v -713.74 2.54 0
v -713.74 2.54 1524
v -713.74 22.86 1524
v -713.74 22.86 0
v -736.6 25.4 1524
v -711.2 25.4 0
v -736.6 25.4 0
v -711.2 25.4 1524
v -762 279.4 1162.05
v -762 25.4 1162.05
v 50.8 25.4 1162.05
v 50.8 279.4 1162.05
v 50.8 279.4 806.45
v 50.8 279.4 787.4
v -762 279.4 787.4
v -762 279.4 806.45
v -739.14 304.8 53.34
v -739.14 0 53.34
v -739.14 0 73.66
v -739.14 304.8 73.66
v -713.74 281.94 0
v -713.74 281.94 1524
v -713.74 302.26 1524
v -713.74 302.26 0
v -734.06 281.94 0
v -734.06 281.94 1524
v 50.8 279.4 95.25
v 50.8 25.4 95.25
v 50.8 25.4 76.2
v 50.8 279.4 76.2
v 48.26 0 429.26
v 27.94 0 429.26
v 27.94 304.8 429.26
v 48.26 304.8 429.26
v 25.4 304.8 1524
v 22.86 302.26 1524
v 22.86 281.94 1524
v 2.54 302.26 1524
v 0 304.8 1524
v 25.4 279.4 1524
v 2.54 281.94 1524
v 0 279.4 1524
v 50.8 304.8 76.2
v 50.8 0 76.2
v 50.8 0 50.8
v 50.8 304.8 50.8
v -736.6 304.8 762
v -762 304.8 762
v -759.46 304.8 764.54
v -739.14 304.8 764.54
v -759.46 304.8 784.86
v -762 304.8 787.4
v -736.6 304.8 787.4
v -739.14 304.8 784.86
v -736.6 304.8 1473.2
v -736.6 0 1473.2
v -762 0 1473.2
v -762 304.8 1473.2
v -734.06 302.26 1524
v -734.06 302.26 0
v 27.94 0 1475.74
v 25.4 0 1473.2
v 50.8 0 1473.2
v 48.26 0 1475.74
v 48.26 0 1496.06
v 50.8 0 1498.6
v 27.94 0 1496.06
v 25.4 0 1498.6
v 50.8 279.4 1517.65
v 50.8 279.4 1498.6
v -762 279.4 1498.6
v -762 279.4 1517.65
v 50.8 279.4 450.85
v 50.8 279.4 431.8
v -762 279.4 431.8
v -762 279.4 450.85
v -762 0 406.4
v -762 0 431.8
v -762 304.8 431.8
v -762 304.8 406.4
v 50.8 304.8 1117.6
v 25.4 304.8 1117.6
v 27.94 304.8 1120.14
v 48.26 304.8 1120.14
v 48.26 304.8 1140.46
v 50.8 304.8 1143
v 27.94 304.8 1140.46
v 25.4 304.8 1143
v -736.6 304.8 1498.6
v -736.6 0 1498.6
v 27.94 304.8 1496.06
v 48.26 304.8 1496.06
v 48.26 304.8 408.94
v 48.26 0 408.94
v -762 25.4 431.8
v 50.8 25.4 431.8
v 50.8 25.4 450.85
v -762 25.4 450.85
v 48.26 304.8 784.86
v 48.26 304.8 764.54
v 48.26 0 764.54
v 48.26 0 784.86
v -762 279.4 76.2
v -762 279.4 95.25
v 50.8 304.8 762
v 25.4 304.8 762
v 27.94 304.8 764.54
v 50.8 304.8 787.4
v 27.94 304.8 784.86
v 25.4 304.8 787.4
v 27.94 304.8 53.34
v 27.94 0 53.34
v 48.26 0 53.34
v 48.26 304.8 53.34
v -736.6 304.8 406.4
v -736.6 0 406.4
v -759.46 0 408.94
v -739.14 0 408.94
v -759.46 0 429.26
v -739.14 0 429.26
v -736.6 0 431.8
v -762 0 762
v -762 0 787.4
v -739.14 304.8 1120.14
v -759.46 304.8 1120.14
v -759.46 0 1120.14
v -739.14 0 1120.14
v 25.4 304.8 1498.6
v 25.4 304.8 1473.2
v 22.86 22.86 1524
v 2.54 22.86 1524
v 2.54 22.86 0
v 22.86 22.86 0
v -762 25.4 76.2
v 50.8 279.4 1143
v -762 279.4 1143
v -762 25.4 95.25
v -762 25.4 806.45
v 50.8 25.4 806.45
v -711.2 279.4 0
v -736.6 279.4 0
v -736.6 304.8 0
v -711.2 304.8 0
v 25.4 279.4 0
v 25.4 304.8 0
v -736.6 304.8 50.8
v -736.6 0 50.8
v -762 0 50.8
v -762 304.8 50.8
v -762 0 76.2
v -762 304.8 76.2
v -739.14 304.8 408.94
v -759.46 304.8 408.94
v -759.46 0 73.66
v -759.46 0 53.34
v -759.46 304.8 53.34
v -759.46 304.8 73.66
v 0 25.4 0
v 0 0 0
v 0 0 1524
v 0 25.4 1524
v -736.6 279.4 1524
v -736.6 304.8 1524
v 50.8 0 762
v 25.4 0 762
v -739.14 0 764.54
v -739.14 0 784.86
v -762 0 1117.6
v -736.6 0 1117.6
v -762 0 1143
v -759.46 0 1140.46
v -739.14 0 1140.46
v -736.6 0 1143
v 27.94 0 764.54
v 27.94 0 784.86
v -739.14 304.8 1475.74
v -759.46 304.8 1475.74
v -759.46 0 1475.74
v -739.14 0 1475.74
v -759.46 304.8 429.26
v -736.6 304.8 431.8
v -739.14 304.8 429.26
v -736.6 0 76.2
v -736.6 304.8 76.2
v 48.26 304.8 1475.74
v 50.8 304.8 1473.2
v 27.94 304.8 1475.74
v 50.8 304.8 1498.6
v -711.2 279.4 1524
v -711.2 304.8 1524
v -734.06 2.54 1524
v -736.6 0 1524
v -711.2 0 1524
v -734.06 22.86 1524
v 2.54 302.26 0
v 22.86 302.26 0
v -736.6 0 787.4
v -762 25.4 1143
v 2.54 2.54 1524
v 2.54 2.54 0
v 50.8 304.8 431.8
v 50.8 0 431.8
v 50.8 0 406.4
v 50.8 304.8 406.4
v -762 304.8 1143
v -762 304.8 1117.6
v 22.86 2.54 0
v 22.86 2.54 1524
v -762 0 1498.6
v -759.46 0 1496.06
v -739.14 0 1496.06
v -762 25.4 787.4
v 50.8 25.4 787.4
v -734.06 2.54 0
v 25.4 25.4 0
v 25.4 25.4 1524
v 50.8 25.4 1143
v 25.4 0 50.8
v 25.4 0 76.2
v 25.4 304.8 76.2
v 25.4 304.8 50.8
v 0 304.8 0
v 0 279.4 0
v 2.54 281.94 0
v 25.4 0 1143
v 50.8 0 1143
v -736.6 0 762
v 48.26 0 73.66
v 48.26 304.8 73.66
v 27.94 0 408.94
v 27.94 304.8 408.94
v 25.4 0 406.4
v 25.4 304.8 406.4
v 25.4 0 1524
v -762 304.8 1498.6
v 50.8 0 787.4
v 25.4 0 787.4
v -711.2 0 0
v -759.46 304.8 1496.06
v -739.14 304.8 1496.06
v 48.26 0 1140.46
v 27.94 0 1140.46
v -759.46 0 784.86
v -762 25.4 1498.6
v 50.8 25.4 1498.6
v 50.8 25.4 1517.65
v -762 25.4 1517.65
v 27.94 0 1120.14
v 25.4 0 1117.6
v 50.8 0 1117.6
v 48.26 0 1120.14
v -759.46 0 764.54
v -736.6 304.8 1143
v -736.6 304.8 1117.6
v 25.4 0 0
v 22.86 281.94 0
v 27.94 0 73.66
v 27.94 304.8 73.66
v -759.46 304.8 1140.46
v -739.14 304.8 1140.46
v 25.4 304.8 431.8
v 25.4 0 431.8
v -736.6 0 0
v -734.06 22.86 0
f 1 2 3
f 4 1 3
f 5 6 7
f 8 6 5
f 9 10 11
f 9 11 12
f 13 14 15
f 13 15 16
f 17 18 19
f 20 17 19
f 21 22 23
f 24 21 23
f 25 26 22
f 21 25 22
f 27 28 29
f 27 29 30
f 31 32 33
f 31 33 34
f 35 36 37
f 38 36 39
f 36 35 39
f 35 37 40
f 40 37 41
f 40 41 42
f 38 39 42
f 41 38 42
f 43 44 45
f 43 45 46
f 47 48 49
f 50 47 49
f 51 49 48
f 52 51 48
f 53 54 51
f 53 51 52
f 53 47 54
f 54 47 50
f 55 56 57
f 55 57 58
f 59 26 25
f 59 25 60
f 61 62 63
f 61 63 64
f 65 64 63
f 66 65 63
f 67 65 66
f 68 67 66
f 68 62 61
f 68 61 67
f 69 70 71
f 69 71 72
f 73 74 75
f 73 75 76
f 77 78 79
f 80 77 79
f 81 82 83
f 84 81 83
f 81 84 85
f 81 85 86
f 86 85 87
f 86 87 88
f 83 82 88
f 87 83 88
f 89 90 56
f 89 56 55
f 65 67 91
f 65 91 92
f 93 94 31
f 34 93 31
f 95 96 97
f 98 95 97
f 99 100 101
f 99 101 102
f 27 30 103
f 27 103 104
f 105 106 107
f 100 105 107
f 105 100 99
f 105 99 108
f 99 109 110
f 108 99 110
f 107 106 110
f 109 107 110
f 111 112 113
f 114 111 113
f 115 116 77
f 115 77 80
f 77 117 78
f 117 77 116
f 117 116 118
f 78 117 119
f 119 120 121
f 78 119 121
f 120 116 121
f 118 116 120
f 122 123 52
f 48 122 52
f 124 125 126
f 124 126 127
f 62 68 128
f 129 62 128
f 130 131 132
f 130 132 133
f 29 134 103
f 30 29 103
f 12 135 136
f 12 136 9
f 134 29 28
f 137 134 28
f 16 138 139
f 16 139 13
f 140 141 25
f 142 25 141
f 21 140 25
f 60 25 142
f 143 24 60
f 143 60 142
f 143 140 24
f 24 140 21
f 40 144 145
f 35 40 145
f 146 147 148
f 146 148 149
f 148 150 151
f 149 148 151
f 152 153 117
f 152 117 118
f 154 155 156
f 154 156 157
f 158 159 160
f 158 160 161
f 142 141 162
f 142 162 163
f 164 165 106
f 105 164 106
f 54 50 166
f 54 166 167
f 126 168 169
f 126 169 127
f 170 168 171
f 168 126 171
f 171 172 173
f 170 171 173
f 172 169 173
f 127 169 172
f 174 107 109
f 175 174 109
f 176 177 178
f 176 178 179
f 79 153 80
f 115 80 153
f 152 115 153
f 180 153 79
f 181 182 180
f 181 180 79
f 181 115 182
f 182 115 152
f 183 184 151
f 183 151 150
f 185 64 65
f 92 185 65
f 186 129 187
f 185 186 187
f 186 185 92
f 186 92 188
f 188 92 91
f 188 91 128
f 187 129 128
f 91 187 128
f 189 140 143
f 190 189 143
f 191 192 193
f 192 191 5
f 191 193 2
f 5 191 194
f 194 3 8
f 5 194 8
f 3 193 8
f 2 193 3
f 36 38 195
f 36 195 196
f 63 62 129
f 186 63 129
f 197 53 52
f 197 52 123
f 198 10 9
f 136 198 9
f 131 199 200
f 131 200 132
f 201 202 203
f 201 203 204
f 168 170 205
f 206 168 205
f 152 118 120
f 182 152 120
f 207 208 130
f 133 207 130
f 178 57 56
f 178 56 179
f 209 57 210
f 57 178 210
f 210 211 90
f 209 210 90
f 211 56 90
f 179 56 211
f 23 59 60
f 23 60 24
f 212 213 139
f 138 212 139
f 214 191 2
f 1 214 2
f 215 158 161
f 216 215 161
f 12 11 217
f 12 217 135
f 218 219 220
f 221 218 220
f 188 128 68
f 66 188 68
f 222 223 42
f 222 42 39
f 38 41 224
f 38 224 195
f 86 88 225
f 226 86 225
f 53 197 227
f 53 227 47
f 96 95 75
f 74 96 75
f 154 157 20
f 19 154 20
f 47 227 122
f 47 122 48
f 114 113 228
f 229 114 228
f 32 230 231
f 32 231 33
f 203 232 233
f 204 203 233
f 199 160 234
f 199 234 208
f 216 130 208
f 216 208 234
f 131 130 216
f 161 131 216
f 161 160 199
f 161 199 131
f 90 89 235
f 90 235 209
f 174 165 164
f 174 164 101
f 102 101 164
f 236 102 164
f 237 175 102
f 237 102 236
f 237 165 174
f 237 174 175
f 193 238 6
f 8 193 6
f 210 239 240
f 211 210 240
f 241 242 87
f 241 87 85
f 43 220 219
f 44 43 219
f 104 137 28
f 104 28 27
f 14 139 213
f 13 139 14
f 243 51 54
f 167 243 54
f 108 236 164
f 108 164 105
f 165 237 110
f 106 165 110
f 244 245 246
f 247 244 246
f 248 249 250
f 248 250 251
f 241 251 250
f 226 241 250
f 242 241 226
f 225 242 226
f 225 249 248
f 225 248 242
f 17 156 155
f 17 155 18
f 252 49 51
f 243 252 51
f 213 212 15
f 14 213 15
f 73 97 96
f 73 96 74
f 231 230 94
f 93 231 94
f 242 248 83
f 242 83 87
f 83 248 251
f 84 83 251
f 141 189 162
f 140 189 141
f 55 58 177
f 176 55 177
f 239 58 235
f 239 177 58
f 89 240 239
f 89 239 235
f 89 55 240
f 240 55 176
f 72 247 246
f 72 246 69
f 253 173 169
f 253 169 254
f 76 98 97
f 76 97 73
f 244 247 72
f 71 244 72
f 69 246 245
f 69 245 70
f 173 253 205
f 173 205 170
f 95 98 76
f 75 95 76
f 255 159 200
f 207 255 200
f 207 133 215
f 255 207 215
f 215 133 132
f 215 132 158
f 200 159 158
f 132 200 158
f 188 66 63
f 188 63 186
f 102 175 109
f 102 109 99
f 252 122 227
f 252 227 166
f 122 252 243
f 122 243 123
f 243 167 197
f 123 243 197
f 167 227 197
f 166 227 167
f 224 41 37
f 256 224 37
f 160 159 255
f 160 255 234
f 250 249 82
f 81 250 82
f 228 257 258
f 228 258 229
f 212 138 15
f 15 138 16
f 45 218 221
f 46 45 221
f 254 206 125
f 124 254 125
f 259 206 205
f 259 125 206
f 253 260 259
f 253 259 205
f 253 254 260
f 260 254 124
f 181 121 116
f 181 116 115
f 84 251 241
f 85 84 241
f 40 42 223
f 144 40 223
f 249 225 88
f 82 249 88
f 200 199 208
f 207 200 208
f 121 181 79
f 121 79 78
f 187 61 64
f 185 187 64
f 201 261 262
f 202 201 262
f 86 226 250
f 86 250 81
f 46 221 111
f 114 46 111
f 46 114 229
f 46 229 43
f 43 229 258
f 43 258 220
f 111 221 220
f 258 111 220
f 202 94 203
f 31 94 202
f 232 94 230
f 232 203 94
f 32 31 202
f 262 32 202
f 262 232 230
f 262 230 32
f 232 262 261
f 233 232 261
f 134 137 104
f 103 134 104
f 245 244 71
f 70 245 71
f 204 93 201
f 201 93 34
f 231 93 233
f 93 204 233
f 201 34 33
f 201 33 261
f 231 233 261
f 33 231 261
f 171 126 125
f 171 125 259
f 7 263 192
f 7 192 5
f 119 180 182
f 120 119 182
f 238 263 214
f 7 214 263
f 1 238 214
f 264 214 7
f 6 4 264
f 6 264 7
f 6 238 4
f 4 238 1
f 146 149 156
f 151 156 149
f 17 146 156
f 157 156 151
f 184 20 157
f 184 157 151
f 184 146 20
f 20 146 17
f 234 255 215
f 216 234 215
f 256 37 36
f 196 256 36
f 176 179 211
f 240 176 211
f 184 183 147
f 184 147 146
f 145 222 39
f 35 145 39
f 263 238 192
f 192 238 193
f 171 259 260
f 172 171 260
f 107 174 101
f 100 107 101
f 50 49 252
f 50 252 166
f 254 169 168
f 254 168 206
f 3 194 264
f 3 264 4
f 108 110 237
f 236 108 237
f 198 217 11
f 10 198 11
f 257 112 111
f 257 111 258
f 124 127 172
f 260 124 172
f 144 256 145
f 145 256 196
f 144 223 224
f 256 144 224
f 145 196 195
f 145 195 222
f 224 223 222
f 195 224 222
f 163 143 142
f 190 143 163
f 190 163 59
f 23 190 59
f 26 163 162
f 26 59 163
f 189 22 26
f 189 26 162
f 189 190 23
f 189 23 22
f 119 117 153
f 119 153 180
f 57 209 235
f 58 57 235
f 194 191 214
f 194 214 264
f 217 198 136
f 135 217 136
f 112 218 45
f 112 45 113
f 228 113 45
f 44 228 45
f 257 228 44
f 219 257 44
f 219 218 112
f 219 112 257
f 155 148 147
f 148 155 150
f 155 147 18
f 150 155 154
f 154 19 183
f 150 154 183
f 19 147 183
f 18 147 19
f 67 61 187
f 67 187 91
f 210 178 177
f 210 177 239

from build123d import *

# Parameters (mm, degrees)
F0_W      = 25.4
F0_H      = 1524
F1_DEPTH  = 25.4
F2_W      = 279.4
F2_H      = 25.4
F2_W_2    = 25.4
F4_DEPTH  = 25.4
F6_W      = 254
F6_H      = 19.05
F7_DEPTH  = 812.8
F8_W      = 20.32
F8_H      = 20.32
F9_DEPTH  = 304.8
F10_W     = 20.32
F10_H     = 20.32
F11_DEPTH = 1524


with BuildPart() as f1:
    # F0 (on Right) → F1 (new body)
    with BuildSketch(Plane.YZ):
        with Locations((12.7, 762)):
            Rectangle(F0_W, F0_H)
        Polygon((304.8, 1524), (279.4, 1524), (279.4, 1498.6), (279.4, 0), (304.8, 0), align=None)
    extrude(amount=F1_DEPTH)


with BuildPart() as f4:
    # F2 (on face) → F4 (new body)
    with BuildSketch(Plane.YZ.offset(25.4)):
        with Locations((165.1, 1485.9)):
            Rectangle(F2_W, F2_H)
        with Locations((165.1, 1130.3)):
            Rectangle(F2_W, F2_H)
        with Locations((165.1, 774.7)):
            Rectangle(F2_W, F2_H)
        with Locations((165.1, 419.1)):
            Rectangle(F2_W, F2_H)
        with Locations((165.1, 63.5)):
            Rectangle(F2_W, F2_H)
        with Locations((12.7, 1130.3)):
            Rectangle(F2_W_2, F2_H)
        with Locations((12.7, 774.7)):
            Rectangle(F2_W_2, F2_H)
        with Locations((12.7, 419.1)):
            Rectangle(F2_W_2, F2_H)
        with Locations((12.7, 63.5)):
            Rectangle(F2_W_2, F2_H)
        with Locations((12.7, 1485.9)):
            Rectangle(F2_W_2, F2_H)
    extrude(amount=F4_DEPTH)


with BuildPart() as f5_1:
    # F5: instance of F1
    add(f1.part.mirror(Plane.YZ.offset(-355.6)))


with BuildPart() as f5_2:
    # F5: instance of F4
    add(f4.part.mirror(Plane.YZ.offset(-355.6)))


with BuildPart() as f7:
    # F6 (on face) → F7 (new body)
    with BuildSketch(Plane.YZ.offset(50.8)):
        with Locations((152.4, 1508.125)):
            Rectangle(F6_W, F6_H)
        with Locations((152.4, 1152.525)):
            Rectangle(F6_W, F6_H)
        with Locations((152.4, 796.925)):
            Rectangle(F6_W, F6_H)
        with Locations((152.4, 441.325)):
            Rectangle(F6_W, F6_H)
        with Locations((152.4, 85.725)):
            Rectangle(F6_W, F6_H)
    extrude(amount=-F7_DEPTH)


with BuildPart() as f9_tool:
    # F8 (on face) → F9 (new body)
    with BuildSketch(Plane.XZ):
        with Locations((-749.3, 1485.9)):
            Rectangle(F8_W, F8_H)
        with Locations((-749.3, 1130.3)):
            Rectangle(F8_W, F8_H)
        with Locations((-749.3, 774.7)):
            Rectangle(F8_W, F8_H)
        with Locations((-749.3, 419.1)):
            Rectangle(F8_W, F8_H)
        with Locations((-749.3, 63.5)):
            Rectangle(F8_W, F8_H)
        with Locations((38.1, 63.5)):
            Rectangle(F8_W, F8_H)
        with Locations((38.1, 774.7)):
            Rectangle(F8_W, F8_H)
        with Locations((38.1, 419.1)):
            Rectangle(F8_W, F8_H)
        with Locations((38.1, 1485.9)):
            Rectangle(F8_W, F8_H)
        with Locations((38.1, 1130.3)):
            Rectangle(F8_W, F8_H)
    extrude(amount=-F9_DEPTH)


with BuildPart() as f4_1:
    add(f4.part)

    # F9: cut by f9_tool
    add(f9_tool.part, mode=Mode.SUBTRACT)


with BuildPart() as f5_2_1:
    add(f5_2.part)

    # F9: cut by f9_tool
    add(f9_tool.part, mode=Mode.SUBTRACT)


with BuildPart() as f11_tool:
    # F10 (on face) → F11 (new body)
    with BuildSketch(Plane.XY.offset(1524)):
        with Locations((-723.9, 12.7)):
            Rectangle(F10_W, F10_H)
        with Locations((-723.9, 292.1)):
            Rectangle(F10_W, F10_H)
        with Locations((12.7, 12.7)):
            Rectangle(F10_W, F10_H)
        with Locations((12.7, 292.1)):
            Rectangle(F10_W, F10_H)
    extrude(amount=-F11_DEPTH)


with BuildPart() as f1_1:
    add(f1.part)

    # F11: cut by f11_tool
    add(f11_tool.part, mode=Mode.SUBTRACT)


with BuildPart() as f5_1_1:
    add(f5_1.part)

    # F11: cut by f11_tool
    add(f11_tool.part, mode=Mode.SUBTRACT)


solid = Compound([f7.part, f4_1.part, f5_2_1.part, f1_1.part, f5_1_1.part])
